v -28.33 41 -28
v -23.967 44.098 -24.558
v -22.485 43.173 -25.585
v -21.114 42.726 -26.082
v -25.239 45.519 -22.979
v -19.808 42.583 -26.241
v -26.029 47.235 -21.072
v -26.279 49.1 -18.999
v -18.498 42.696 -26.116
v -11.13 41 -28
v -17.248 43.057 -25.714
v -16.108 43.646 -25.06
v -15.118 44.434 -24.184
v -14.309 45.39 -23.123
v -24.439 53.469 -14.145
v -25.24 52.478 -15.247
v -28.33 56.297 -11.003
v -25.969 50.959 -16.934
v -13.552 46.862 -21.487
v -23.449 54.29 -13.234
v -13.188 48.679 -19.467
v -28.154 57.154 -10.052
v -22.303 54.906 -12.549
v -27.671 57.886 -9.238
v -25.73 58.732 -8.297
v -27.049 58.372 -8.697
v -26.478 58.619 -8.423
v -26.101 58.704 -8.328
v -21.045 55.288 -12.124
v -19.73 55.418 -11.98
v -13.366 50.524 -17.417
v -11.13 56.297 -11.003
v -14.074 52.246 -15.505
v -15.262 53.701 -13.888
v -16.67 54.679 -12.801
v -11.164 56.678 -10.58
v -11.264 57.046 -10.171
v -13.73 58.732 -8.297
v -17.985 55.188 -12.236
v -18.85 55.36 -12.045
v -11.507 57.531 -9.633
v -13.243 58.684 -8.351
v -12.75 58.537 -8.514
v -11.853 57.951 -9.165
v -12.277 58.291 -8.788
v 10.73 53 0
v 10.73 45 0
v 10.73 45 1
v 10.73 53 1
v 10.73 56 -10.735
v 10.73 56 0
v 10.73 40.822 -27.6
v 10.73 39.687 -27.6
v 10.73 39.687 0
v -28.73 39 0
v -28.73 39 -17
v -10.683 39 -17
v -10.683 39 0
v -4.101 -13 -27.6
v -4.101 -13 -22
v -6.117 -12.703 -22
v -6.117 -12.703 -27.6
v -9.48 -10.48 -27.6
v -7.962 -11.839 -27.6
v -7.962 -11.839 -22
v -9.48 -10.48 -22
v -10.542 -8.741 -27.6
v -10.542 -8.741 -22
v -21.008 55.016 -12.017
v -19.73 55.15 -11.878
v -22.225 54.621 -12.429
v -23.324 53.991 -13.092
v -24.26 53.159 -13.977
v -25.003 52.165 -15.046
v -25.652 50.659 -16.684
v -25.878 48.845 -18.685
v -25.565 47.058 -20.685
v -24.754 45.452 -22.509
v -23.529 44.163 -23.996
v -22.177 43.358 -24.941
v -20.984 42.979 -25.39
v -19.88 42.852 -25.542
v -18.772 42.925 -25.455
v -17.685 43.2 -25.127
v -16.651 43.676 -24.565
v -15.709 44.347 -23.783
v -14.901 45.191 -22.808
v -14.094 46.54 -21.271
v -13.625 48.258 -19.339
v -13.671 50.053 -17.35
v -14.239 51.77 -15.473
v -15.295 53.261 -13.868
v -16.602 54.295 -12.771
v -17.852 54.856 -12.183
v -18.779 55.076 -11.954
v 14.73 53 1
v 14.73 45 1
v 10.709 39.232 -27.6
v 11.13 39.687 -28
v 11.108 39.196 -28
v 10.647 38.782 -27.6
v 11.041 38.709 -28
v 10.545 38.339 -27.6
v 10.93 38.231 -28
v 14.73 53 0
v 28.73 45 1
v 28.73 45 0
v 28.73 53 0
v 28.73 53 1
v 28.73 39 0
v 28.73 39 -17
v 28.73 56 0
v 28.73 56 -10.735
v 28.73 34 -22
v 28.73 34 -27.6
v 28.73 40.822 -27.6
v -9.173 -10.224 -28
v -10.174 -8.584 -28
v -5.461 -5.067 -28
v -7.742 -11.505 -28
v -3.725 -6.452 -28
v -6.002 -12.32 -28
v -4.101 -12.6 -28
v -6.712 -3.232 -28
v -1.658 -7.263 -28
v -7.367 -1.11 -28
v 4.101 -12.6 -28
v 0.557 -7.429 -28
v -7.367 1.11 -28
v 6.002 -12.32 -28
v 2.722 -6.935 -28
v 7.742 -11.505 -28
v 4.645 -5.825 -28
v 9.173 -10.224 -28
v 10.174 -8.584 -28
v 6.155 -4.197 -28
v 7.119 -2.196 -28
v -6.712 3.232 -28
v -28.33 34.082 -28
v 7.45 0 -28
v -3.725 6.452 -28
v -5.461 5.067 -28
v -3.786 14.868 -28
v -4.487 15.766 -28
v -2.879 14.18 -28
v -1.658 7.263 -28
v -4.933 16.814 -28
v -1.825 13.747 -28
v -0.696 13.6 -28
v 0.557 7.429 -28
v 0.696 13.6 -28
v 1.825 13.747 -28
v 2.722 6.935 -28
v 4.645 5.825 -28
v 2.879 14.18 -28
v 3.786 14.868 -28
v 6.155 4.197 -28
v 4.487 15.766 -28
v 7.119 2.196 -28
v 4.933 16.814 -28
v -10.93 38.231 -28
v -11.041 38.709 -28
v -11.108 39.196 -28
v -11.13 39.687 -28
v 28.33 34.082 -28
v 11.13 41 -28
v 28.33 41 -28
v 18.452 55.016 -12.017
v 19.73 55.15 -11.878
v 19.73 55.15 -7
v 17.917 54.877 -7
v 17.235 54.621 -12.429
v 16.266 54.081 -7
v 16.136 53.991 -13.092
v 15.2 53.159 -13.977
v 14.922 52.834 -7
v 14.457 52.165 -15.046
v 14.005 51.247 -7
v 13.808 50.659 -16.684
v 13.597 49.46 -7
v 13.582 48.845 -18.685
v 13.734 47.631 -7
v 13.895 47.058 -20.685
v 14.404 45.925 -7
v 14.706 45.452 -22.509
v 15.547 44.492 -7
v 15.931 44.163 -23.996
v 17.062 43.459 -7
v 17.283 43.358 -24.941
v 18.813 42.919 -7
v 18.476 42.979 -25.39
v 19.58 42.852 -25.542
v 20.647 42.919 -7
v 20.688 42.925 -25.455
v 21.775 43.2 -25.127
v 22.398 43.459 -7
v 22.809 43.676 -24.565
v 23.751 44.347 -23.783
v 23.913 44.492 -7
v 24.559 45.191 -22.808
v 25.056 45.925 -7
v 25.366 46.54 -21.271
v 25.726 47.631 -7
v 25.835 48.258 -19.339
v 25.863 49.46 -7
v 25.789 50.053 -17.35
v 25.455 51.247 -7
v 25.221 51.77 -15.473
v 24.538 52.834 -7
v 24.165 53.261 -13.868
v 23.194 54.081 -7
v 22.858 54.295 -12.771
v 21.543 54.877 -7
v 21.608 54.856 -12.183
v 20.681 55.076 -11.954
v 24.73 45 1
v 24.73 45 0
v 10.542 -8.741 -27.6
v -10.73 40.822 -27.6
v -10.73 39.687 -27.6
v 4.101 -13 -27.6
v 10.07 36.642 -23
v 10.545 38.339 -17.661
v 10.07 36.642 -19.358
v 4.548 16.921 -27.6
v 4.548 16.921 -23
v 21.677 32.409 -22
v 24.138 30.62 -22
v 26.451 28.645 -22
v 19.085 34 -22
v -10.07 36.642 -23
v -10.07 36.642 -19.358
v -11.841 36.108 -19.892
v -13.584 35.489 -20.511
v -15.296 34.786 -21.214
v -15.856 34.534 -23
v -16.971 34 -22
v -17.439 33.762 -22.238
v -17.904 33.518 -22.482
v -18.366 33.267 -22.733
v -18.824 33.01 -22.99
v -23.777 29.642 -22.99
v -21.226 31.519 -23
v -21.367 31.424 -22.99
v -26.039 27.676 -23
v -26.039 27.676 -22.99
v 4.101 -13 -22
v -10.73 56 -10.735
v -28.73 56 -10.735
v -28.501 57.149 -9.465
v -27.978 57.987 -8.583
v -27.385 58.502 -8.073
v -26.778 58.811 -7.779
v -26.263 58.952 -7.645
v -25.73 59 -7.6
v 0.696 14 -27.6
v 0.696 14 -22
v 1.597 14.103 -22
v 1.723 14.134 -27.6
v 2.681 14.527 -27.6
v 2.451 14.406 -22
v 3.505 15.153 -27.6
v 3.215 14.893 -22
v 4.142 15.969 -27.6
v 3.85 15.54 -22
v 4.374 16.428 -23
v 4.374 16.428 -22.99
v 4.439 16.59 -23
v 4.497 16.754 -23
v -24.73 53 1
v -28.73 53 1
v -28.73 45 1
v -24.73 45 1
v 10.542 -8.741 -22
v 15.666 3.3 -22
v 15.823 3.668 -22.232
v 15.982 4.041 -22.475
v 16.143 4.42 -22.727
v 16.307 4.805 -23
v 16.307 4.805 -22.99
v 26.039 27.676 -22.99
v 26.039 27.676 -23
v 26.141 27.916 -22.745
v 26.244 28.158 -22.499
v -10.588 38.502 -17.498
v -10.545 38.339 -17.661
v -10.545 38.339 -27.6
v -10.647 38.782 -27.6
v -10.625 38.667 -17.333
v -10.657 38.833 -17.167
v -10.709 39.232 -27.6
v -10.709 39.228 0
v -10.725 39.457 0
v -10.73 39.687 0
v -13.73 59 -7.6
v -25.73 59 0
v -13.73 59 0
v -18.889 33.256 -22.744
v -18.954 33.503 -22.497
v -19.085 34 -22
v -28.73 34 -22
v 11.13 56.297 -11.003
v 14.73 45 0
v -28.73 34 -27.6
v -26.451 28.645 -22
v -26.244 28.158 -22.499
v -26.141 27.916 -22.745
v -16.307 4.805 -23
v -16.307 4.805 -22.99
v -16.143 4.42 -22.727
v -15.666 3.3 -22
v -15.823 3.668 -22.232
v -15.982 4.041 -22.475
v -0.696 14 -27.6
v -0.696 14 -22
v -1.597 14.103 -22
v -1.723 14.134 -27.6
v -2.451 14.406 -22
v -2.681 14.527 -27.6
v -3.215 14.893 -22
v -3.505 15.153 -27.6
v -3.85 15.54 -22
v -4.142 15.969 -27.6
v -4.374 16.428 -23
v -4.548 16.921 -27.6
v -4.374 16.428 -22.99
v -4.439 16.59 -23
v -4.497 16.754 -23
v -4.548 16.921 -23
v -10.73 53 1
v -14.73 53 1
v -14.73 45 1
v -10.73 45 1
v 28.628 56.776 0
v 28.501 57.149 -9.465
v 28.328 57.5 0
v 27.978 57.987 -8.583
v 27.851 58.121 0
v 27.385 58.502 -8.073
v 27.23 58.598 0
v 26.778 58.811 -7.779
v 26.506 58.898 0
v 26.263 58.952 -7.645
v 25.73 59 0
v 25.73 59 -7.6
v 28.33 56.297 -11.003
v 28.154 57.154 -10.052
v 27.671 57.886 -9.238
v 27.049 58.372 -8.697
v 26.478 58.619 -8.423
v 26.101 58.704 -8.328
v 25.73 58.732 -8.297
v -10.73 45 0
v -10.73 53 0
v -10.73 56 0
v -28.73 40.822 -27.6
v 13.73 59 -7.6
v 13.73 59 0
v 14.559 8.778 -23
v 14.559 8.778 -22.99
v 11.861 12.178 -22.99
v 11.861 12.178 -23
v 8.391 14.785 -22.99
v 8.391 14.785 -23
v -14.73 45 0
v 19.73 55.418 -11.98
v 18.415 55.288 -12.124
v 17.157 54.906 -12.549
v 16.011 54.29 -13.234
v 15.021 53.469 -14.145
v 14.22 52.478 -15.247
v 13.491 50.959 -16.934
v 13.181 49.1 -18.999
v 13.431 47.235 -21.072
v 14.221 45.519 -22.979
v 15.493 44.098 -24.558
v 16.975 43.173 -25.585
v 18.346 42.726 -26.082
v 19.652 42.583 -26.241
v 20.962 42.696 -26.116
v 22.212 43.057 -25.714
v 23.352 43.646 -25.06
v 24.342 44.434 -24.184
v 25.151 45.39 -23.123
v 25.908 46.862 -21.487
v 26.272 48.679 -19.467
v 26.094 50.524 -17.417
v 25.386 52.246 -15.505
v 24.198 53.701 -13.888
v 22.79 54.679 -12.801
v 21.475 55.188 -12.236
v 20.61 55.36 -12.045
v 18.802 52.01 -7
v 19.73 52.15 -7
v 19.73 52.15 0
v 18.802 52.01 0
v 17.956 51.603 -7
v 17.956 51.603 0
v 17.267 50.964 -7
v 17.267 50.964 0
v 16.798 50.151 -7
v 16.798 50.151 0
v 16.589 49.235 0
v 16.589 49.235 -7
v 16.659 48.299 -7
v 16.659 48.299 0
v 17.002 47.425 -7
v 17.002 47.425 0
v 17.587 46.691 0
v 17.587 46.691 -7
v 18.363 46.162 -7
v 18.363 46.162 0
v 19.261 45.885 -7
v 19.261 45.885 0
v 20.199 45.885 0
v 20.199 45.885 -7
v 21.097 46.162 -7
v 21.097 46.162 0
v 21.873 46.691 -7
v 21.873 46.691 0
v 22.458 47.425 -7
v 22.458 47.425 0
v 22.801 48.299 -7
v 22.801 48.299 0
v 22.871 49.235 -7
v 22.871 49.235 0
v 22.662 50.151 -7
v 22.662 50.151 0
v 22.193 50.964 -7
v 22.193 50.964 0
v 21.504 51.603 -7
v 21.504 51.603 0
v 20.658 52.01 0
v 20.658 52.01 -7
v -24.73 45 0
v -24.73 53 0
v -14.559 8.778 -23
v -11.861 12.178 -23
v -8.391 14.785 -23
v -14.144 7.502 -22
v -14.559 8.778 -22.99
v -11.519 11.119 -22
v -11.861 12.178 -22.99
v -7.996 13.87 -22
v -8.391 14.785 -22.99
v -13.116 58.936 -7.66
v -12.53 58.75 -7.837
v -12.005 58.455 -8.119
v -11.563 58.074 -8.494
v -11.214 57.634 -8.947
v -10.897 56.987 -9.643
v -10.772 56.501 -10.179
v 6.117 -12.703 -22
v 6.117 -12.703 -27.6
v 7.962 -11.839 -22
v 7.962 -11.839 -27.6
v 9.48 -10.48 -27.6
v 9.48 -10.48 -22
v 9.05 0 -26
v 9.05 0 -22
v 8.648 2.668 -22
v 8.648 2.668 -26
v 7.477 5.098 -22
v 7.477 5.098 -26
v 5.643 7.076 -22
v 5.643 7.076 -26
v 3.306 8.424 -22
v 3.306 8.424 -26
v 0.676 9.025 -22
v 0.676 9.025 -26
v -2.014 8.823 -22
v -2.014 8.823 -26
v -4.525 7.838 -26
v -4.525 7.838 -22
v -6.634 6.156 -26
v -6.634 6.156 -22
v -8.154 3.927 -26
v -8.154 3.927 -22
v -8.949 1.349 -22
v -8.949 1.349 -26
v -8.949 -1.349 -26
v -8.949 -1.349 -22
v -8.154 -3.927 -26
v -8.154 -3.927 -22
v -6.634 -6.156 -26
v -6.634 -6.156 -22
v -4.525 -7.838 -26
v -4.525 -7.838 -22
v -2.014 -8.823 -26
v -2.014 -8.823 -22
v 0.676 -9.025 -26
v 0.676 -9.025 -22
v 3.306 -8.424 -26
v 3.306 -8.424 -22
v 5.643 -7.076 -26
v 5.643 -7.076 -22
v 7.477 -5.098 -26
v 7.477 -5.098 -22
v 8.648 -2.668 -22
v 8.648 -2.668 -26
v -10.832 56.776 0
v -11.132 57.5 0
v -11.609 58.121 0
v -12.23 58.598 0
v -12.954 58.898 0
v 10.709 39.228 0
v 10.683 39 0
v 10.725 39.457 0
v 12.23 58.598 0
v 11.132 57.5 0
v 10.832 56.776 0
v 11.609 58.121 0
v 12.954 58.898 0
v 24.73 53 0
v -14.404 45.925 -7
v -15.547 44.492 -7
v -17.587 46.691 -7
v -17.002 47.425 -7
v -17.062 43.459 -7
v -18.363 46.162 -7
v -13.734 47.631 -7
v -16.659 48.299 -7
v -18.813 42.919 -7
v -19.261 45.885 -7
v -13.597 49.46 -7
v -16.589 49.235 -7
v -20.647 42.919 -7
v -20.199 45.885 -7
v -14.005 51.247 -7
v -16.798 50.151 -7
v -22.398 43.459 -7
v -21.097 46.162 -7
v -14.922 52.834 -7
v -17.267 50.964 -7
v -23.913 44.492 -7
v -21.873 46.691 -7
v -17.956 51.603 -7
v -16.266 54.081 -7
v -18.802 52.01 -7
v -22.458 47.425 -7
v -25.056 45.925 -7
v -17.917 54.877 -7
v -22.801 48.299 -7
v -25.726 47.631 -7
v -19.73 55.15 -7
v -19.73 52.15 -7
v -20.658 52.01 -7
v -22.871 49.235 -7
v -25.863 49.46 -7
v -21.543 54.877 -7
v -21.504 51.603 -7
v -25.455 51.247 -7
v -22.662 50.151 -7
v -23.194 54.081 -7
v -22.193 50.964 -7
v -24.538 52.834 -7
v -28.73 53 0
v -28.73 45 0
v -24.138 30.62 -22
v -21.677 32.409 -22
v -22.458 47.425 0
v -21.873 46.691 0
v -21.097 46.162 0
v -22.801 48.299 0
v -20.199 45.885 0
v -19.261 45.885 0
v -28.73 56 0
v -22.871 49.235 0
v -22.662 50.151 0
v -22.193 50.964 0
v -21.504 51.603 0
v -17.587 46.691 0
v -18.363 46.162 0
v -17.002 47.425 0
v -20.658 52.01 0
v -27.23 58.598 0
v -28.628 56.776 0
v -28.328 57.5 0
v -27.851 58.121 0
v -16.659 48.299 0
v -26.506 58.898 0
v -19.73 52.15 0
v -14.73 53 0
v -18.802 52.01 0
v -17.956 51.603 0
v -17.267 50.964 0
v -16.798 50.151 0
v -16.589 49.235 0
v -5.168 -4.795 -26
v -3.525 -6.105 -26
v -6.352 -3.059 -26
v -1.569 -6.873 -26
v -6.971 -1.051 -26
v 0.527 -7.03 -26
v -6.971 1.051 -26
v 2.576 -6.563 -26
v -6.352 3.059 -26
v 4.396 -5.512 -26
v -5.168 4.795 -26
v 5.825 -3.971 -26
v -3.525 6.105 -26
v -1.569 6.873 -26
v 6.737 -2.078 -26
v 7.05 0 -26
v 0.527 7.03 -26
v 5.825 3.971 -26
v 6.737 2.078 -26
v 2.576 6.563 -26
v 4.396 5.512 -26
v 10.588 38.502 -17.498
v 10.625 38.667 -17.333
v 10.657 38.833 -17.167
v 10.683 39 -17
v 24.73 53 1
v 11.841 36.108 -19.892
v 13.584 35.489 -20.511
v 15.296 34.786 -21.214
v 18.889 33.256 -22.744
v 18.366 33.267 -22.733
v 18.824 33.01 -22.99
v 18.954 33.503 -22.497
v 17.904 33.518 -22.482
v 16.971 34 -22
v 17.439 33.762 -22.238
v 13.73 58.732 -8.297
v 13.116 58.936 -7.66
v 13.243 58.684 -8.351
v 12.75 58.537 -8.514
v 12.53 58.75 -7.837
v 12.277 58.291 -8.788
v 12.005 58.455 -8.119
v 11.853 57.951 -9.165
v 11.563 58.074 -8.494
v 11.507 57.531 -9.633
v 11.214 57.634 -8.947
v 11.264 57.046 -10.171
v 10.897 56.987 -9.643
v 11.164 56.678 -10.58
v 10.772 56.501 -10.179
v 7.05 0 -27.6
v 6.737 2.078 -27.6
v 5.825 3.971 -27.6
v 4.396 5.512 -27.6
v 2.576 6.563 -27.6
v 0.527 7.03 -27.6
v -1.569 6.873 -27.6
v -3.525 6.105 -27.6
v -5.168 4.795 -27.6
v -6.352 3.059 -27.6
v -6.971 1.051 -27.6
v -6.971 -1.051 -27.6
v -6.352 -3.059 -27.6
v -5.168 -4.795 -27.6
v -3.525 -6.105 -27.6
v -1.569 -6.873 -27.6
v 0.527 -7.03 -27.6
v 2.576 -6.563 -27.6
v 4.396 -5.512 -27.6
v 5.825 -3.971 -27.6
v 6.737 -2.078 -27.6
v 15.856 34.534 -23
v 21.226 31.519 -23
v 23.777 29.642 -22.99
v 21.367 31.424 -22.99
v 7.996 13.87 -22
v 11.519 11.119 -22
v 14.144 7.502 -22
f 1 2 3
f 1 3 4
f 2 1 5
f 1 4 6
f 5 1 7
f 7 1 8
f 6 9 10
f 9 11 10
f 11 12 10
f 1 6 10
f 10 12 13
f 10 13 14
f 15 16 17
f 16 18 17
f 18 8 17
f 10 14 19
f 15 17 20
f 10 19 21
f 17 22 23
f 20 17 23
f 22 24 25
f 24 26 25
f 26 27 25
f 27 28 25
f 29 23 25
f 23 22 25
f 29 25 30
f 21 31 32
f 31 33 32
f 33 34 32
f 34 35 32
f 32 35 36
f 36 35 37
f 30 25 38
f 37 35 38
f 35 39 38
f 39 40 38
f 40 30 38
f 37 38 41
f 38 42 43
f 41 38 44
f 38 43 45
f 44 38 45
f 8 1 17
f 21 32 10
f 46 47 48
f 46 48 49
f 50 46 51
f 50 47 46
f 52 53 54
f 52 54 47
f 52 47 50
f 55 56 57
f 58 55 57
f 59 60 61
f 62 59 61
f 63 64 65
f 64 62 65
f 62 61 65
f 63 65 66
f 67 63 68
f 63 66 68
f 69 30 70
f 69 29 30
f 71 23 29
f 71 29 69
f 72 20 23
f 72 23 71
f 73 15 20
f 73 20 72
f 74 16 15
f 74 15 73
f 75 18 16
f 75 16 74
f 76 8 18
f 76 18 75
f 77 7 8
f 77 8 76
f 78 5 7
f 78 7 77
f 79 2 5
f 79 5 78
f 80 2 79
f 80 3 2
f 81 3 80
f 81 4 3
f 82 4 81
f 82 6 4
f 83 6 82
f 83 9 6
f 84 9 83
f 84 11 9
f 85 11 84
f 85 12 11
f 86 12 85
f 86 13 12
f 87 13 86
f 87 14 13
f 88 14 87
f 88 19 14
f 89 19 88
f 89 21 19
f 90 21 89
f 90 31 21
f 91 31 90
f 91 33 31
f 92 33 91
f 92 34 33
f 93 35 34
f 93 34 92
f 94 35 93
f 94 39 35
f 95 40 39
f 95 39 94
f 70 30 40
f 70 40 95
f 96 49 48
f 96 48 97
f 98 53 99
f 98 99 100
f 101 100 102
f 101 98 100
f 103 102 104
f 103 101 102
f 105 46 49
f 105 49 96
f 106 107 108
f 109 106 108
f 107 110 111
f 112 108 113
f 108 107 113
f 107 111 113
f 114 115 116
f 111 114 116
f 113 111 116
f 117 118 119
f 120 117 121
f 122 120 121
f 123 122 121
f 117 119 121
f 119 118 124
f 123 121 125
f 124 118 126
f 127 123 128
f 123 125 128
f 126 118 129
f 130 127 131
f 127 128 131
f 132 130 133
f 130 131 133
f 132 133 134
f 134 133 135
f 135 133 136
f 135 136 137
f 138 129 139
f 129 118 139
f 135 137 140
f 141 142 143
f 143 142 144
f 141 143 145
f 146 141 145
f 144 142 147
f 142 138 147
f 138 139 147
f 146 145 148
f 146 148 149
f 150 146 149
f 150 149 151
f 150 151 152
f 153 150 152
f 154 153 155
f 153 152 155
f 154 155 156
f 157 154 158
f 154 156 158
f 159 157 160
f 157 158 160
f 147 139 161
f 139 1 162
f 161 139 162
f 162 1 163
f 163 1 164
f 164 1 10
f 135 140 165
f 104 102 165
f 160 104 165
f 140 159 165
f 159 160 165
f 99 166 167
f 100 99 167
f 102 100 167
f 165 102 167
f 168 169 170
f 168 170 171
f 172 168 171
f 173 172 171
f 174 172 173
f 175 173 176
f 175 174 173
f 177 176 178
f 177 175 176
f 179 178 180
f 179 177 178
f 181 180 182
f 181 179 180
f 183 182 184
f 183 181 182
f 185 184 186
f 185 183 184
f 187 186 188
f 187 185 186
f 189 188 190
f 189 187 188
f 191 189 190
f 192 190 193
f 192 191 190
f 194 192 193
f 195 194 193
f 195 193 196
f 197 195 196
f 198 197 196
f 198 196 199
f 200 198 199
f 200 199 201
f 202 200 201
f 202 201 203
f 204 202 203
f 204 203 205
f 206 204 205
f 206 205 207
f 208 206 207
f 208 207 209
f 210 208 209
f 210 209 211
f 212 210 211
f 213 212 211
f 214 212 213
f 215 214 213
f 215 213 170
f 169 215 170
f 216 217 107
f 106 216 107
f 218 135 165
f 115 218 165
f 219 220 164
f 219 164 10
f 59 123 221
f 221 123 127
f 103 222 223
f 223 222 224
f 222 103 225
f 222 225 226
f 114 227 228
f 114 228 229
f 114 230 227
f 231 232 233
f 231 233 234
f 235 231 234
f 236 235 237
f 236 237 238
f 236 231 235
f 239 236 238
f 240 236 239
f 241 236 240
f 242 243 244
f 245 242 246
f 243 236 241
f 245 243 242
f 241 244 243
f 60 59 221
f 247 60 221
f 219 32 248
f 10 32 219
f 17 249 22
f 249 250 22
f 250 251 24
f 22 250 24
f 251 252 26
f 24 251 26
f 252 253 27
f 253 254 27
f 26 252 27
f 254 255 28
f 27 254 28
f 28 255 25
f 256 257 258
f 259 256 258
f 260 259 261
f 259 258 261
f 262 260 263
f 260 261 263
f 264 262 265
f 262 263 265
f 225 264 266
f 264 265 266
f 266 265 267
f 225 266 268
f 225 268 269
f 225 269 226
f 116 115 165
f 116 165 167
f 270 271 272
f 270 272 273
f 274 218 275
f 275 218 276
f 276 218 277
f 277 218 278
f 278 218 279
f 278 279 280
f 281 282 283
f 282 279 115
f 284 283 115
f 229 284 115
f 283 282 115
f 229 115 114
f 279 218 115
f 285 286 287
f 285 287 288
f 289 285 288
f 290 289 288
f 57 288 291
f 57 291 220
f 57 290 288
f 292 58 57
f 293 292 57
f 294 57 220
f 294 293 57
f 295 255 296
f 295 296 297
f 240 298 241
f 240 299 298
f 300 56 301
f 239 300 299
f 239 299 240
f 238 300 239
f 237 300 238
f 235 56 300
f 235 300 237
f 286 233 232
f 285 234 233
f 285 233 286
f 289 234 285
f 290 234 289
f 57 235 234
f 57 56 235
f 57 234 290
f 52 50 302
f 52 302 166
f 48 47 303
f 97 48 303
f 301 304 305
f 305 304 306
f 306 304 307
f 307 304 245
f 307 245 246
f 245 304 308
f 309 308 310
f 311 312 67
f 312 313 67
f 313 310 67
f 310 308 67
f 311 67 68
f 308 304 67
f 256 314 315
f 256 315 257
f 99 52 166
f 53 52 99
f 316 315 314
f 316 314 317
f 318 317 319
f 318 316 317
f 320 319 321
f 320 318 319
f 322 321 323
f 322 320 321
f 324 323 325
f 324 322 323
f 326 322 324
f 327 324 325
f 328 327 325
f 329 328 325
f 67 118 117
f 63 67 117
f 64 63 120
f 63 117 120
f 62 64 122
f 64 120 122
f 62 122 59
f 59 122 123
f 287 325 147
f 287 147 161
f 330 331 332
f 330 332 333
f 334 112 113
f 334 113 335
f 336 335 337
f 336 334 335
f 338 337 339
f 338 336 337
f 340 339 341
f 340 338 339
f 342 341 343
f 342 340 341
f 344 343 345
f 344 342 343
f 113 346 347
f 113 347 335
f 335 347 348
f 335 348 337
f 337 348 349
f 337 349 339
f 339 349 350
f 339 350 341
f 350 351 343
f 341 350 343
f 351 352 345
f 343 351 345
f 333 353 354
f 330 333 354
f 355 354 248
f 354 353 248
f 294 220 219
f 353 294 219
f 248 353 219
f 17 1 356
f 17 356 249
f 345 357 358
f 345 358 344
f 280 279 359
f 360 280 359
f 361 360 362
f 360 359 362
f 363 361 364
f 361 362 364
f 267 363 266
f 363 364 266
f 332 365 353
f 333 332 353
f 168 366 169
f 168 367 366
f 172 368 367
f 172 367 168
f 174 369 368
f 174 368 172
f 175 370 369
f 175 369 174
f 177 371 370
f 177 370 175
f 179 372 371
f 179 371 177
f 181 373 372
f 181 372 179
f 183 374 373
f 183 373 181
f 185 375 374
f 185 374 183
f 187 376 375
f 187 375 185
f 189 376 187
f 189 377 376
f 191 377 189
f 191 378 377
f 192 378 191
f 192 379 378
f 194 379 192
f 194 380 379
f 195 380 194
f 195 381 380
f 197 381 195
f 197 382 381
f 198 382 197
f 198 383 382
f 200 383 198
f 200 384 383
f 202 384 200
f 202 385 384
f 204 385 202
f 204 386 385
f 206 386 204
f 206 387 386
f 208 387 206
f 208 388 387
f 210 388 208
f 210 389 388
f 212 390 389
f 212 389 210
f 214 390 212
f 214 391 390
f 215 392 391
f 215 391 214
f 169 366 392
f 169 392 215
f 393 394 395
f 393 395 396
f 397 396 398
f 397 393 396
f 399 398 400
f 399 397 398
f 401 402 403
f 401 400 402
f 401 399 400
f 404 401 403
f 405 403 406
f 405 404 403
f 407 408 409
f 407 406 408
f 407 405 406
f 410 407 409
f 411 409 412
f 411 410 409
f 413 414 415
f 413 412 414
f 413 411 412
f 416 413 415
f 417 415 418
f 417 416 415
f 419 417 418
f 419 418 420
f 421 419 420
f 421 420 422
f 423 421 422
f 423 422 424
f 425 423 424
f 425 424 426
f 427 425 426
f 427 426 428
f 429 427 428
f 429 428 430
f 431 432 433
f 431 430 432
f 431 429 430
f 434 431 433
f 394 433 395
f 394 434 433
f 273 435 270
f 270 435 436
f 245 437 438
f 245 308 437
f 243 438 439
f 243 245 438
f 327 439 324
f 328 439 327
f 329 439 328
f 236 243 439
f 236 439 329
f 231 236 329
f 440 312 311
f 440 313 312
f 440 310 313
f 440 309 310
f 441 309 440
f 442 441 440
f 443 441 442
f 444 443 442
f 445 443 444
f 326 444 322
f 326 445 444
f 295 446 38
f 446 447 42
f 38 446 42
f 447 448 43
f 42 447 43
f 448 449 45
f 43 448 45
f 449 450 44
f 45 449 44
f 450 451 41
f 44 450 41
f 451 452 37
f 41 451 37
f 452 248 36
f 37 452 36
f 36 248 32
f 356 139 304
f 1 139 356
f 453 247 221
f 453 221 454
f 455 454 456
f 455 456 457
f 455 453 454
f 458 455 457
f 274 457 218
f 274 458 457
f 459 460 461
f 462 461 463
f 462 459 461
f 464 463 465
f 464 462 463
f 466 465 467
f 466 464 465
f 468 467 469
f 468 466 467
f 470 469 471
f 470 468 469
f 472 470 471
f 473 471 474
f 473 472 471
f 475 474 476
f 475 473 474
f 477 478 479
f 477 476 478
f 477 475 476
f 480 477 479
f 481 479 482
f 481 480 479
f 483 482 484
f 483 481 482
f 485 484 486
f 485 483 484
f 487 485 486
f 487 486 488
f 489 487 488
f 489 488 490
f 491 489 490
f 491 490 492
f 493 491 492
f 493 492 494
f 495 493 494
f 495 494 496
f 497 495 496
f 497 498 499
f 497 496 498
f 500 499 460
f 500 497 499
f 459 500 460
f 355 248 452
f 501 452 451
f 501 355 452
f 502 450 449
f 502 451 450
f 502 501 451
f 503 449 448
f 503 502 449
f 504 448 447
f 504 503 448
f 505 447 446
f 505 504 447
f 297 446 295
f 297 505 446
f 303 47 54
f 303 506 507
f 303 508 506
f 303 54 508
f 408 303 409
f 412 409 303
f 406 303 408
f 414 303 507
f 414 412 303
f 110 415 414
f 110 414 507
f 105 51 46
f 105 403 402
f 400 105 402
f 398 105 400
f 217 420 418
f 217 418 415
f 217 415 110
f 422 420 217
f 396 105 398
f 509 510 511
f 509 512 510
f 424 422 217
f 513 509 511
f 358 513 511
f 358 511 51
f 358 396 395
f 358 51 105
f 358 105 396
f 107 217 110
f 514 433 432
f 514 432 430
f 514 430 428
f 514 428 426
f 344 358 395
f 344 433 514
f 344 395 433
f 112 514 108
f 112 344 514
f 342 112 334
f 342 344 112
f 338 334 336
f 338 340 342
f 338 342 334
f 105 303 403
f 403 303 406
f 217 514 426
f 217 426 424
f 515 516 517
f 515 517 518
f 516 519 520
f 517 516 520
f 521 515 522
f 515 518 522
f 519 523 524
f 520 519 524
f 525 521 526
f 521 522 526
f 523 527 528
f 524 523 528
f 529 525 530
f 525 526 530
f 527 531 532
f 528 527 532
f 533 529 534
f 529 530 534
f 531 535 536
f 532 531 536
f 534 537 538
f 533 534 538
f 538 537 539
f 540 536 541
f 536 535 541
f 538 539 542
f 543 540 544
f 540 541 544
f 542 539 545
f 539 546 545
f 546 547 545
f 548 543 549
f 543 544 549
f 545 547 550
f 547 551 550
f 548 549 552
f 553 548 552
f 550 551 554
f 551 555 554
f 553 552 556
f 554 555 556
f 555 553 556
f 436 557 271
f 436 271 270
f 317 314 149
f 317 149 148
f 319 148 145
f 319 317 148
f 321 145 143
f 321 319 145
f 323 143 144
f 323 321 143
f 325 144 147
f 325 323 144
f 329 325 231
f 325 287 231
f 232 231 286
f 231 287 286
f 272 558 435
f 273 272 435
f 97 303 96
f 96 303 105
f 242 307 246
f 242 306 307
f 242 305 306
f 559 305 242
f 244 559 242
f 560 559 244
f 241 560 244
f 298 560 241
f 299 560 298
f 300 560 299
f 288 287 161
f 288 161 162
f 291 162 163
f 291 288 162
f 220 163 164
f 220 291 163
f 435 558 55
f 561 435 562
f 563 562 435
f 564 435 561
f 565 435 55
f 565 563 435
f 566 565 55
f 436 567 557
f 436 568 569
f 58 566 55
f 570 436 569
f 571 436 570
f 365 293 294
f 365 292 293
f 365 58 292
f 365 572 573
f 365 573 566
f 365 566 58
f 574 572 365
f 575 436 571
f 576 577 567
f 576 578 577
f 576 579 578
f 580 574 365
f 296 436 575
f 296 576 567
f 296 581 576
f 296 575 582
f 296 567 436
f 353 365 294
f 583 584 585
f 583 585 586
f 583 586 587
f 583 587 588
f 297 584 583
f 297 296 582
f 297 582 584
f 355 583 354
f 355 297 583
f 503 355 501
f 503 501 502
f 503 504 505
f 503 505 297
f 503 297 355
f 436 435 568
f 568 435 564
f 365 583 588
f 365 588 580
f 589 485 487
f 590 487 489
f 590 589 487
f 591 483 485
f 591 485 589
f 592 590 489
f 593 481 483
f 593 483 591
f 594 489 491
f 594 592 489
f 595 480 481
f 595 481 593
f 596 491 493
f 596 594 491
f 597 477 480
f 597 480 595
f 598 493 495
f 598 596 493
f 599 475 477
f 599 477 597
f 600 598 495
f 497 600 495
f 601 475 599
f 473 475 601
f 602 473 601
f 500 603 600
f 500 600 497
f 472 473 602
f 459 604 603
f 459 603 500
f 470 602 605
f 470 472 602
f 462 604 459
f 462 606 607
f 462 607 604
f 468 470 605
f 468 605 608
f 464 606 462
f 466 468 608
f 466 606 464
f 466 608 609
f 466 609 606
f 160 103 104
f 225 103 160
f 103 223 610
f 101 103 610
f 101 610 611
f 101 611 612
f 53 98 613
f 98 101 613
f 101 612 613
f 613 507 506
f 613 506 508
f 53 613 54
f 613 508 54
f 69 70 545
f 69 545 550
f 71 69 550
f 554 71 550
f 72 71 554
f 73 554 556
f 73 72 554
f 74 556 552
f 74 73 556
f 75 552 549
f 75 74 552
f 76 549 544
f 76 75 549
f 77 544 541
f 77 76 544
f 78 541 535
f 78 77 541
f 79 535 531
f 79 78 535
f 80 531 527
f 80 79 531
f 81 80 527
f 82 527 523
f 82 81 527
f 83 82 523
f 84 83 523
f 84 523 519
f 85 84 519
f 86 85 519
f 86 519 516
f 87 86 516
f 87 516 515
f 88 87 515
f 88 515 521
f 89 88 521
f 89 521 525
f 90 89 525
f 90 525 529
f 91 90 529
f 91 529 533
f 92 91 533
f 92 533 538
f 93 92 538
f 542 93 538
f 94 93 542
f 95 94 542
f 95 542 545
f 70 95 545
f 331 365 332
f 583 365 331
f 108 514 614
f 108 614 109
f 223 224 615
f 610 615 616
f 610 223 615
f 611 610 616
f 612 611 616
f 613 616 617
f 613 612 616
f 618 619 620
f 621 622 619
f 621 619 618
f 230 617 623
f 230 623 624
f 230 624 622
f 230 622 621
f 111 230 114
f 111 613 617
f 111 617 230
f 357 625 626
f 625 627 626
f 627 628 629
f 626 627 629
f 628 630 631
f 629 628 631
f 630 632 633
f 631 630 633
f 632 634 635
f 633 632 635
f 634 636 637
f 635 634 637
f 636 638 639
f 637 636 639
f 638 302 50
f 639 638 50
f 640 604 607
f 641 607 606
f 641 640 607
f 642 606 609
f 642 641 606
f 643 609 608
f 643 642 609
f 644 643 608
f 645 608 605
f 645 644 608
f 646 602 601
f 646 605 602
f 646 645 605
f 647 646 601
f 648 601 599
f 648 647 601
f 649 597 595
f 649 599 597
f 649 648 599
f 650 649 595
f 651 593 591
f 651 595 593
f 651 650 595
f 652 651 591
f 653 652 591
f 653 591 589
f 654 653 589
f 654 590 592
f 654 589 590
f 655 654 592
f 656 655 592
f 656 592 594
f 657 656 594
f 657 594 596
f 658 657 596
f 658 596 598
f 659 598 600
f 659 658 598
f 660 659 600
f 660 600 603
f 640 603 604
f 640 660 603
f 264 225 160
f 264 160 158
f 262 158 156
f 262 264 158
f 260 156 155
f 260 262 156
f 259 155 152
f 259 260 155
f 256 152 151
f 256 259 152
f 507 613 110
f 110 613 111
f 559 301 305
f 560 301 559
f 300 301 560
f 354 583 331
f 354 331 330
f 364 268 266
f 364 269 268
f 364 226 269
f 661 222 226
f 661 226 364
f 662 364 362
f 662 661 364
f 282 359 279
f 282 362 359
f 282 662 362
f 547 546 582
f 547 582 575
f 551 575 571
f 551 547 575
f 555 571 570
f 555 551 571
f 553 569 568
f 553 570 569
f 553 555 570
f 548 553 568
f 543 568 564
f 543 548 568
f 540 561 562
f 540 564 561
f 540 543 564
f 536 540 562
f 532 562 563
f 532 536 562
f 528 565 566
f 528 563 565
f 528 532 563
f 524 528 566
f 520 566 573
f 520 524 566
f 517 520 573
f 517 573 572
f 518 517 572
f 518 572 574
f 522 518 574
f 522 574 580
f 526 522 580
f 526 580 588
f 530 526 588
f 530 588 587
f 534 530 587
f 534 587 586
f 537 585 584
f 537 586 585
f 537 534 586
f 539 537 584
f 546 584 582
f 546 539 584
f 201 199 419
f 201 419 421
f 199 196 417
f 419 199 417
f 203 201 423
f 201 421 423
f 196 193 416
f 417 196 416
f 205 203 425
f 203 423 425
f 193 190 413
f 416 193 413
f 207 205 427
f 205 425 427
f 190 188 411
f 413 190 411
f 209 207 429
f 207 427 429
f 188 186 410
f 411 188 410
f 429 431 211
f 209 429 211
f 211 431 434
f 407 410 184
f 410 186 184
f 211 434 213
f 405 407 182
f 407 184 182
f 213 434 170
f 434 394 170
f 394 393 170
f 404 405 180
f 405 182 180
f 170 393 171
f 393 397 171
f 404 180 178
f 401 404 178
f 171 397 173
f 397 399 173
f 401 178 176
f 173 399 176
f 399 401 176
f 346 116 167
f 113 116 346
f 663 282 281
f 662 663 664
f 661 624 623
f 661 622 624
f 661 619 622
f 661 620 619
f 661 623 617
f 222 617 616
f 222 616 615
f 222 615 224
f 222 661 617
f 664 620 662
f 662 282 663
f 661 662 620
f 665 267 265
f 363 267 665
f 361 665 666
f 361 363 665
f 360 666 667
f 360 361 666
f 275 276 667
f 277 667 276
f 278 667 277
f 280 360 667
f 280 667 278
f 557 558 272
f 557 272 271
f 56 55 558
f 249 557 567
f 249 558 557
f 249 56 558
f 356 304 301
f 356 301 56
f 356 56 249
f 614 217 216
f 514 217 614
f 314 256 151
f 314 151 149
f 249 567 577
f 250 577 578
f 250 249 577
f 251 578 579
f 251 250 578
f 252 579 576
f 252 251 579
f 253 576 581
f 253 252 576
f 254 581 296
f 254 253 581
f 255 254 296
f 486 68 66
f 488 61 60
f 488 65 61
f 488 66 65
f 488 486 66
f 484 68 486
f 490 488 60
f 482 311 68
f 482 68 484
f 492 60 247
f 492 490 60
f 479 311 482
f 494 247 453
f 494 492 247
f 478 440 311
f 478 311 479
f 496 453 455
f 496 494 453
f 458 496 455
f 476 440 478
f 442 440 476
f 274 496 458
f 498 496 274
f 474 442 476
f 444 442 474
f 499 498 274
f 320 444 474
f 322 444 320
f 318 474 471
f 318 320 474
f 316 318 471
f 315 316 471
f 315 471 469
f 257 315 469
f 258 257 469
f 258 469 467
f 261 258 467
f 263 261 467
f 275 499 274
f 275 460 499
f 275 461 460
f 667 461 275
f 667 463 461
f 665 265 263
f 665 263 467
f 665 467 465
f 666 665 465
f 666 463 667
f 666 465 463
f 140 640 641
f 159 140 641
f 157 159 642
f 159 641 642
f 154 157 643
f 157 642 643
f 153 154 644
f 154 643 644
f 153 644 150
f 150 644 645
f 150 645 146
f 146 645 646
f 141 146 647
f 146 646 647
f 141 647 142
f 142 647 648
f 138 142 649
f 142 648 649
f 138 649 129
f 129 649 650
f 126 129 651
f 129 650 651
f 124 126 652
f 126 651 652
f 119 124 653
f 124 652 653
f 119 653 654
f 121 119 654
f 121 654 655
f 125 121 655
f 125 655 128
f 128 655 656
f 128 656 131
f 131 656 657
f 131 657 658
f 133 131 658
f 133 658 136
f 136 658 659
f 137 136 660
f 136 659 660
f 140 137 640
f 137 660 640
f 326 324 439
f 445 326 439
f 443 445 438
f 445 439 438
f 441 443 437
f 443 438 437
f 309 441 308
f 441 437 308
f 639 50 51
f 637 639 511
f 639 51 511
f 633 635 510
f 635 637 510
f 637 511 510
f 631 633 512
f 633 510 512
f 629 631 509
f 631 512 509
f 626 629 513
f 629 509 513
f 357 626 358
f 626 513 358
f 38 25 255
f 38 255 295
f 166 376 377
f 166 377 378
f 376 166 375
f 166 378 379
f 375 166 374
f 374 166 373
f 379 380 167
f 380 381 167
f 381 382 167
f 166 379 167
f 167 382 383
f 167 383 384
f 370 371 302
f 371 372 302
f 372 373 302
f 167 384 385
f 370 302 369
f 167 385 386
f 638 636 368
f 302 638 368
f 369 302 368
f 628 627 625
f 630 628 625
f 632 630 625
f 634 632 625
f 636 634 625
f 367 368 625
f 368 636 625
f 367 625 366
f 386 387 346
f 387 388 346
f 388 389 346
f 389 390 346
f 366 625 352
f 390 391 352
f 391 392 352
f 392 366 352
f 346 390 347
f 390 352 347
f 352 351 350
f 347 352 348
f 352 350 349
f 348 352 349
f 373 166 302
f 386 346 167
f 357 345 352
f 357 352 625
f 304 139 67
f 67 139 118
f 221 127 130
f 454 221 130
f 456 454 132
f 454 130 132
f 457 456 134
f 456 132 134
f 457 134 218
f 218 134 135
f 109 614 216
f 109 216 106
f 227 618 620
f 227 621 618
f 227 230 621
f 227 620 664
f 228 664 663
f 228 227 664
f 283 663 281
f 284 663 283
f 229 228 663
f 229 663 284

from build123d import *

# Parameters (mm, degrees)
CYLINDER037_R                = 17
CYLINDER037_DEPTH            = 10
CYLINDER036_R                = 38
CYLINDER036_DEPTH            = 10
BOX046_W                     = 4
BOX046_H                     = 8
BOX046_DEPTH                 = 1
BOX045_W                     = 4
BOX045_H                     = 8
BOX045_DEPTH                 = 1
BOX043_W                     = 4
BOX043_H                     = 8
BOX043_DEPTH                 = 1
BOX047_W                     = 4
BOX047_H                     = 8
BOX047_DEPTH                 = 1
CYLINDER033_R                = 3.15
CYLINDER033_DEPTH            = 65
CYLINDER034_R                = 3.15
CYLINDER034_DEPTH            = 65
CYLINDER032_R                = 6.15
CYLINDER032_DEPTH            = 28
CYLINDER031_R                = 6.15
CYLINDER031_DEPTH            = 28
BOX044_W                     = 21.46
BOX044_H                     = 55
BOX044_DEPTH                 = 45
CHAMFER003068012002082_SIZE2 = 7
CHAMFER003068012002082_SIZE  = 25
CHAMFER003068012002083_SIZE2 = 25
CHAMFER003068012002083_SIZE  = 7
FILLET003002010_R            = 4
FILLET003002011_R            = 5
CYLINDER_R                   = 9.05
CYLINDER_DEPTH               = 10
CYLINDER030_R                = 7.05
CYLINDER030_DEPTH            = 10
BOX041_W                     = 57.46
BOX041_H                     = 72
BOX041_DEPTH                 = 6
CHAMFER003068012002084_SIZE2 = 20
CHAMFER003068012002084_SIZE  = 47
CHAMFER003068012002085_SIZE2 = 47
CHAMFER003068012002085_SIZE  = 20
FILLET003002012_R            = 7
BOX042_W                     = 57.46
BOX042_H                     = 20
BOX042_DEPTH                 = 22
CHAMFER003068012002086_SIZE2 = 20
CHAMFER003068012002086_SIZE  = 18
CHAMFER003068012002087_SIZE  = 5
FILLET003002013_R            = 3
CHAMFER003068012002088_SIZE  = 0.99
CHAMFER003068012002089_SIZE  = 0.99
CHAMFER003068012002090_SIZE  = 0.4


with BuildPart() as cylinder037:
    # Cylinder037 → Cylinder037 (new body)
    with BuildSketch(Plane.XY.offset(-23)):
        Circle(CYLINDER037_R)
    extrude(amount=CYLINDER037_DEPTH)


with BuildPart() as cut001040:
    # Cylinder036 → Cylinder036 (new body)
    with BuildSketch(Plane.XY.offset(-23)):
        Circle(CYLINDER036_R)
    extrude(amount=CYLINDER036_DEPTH)

    # Cut001040: cut Cylinder037
    add(cylinder037.part, mode=Mode.SUBTRACT)


with BuildPart() as cube046:
    # Box046 → Box046 (new body)
    with BuildSketch(Plane(origin=(10.73, 45, 0), x_dir=(1, 0, 0), z_dir=(0, 0, 1))):
        with Locations((2, 4)):
            Rectangle(BOX046_W, BOX046_H)
    extrude(amount=BOX046_DEPTH)


with BuildPart() as cube045:
    # Box045 → Box045 (new body)
    with BuildSketch(Plane(origin=(-14.73, 45, 0), x_dir=(1, 0, 0), z_dir=(0, 0, 1))):
        with Locations((2, 4)):
            Rectangle(BOX045_W, BOX045_H)
    extrude(amount=BOX045_DEPTH)


with BuildPart() as cube043:
    # Box043 → Box043 (new body)
    with BuildSketch(Plane(origin=(-28.73, 45, 0), x_dir=(1, 0, 0), z_dir=(0, 0, 1))):
        with Locations((2, 4)):
            Rectangle(BOX043_W, BOX043_H)
    extrude(amount=BOX043_DEPTH)


with BuildPart() as fusion001002012032:
    # Box047 → Box047 (new body)
    with BuildSketch(Plane(origin=(24.73, 45, 0), x_dir=(1, 0, 0), z_dir=(0, 0, 1))):
        with Locations((2, 4)):
            Rectangle(BOX047_W, BOX047_H)
    extrude(amount=BOX047_DEPTH)

    # Fusion001002012032: union Cube046, Cube045, Cube043
    add(cube046.part)
    add(cube045.part)
    add(cube043.part)


with BuildPart() as cylinder033:
    # Cylinder033 → Cylinder033 (new body)
    with BuildSketch(Plane(origin=(-19.73, 49, -41), x_dir=(0, 1, 0), z_dir=(0, 0, 1))):
        Circle(CYLINDER033_R)
    extrude(amount=CYLINDER033_DEPTH)


with BuildPart() as fusion001002012030:
    # Cylinder034 → Cylinder034 (new body)
    with BuildSketch(Plane(origin=(19.73, 49, -41), x_dir=(0, 1, 0), z_dir=(0, 0, 1))):
        Circle(CYLINDER034_R)
    extrude(amount=CYLINDER034_DEPTH)

    # Fusion001002012030: union Cylinder033
    add(cylinder033.part)


with BuildPart() as cylinder032:
    # Cylinder032 → Cylinder032 (new body)
    with BuildSketch(Plane(origin=(-19.73, 49, -41), x_dir=(0, 1, 0), z_dir=(0, 0, 1))):
        Circle(CYLINDER032_R)
    extrude(amount=CYLINDER032_DEPTH)


with BuildPart() as fusion001002012031:
    # Cylinder031 → Cylinder031 (new body)
    with BuildSketch(Plane(origin=(19.73, 49, -41), x_dir=(0, 1, 0), z_dir=(0, 0, 1))):
        Circle(CYLINDER031_R)
    extrude(amount=CYLINDER031_DEPTH)

    # Fusion001002012031: union Cylinder032
    add(cylinder032.part)


with BuildPart() as fusion001002012031_1:
    # Fusion001002012031 placement: moved
    add(fusion001002012031.part.moved(Location((0, 0, 6))))


with BuildPart() as fillet003002011:
    # Box044 → Box044 (new body)
    with BuildSketch(Plane(origin=(-10.73, 14, -35), x_dir=(1, 0, 0), z_dir=(0, 0, 1))):
        with Locations((10.73, 27.5)):
            Rectangle(BOX044_W, BOX044_H)
    extrude(amount=BOX044_DEPTH)

    # Chamfer003068012002082
    chamfer003068012002082_edges = [fillet003002011.edges().sort_by_distance(p)[0] for p in [
        (10.73, 14, -12.5),
    ]]
    chamfer003068012002082_side = fillet003002011.faces().sort_by_distance((10.73, 41.5, -12.5))[0]
    chamfer(chamfer003068012002082_edges, length=CHAMFER003068012002082_SIZE, length2=CHAMFER003068012002082_SIZE2, reference=chamfer003068012002082_side)

    # Chamfer003068012002083
    chamfer003068012002083_edges = [fillet003002011.edges().sort_by_distance(p)[0] for p in [
        (-10.73, 14, -12.5),
    ]]
    chamfer003068012002083_side = fillet003002011.faces().sort_by_distance((-3.5, 14, -12.5))[0]
    chamfer(chamfer003068012002083_edges, length=CHAMFER003068012002083_SIZE, length2=CHAMFER003068012002083_SIZE2, reference=chamfer003068012002083_side)

    # Fillet003002010
    fillet003002010_edges = [fillet003002011.edges().sort_by_distance(p)[0] for p in [
        (-3.73, 14, -12.5),
        (3.73, 14, -12.5),
    ]]
    fillet(fillet003002010_edges, radius=FILLET003002010_R)

    # Fillet003002011
    fillet003002011_edges = [fillet003002011.edges().sort_by_distance(p)[0] for p in [
        (-10.73, 39, -12.5),
        (10.73, 39, -12.5),
    ]]
    fillet(fillet003002011_edges, radius=FILLET003002011_R)


with BuildPart() as cylinder:
    # Cylinder → Cylinder (new body)
    with BuildSketch(Plane.XY.offset(-27)):
        Circle(CYLINDER_R)
    extrude(amount=CYLINDER_DEPTH)


with BuildPart() as fusion001002012028:
    # Cylinder030 → Cylinder030 (new body)
    with BuildSketch(Plane.XY.offset(-29)):
        Circle(CYLINDER030_R)
    extrude(amount=CYLINDER030_DEPTH)

    # Fusion001002012028: union Cylinder
    add(cylinder.part)


with BuildPart() as fusion001002012028_1:
    # Fusion001002012028 placement: moved
    add(fusion001002012028.part.moved(Location((0, 0, 1))))


with BuildPart() as fillet003002012:
    # Box041 → Box041 (new body)
    with BuildSketch(Plane(origin=(-28.73, -13, -28), x_dir=(1, 0, 0), z_dir=(0, 0, 1))):
        with Locations((28.73, 36)):
            Rectangle(BOX041_W, BOX041_H)
    extrude(amount=BOX041_DEPTH)

    # Chamfer003068012002084
    chamfer003068012002084_edges = [fillet003002012.edges().sort_by_distance(p)[0] for p in [
        (-28.73, -13, -25),
    ]]
    chamfer003068012002084_side = fillet003002012.faces().sort_by_distance((-28.73, 23, -25))[0]
    chamfer(chamfer003068012002084_edges, length=CHAMFER003068012002084_SIZE, length2=CHAMFER003068012002084_SIZE2, reference=chamfer003068012002084_side)

    # Chamfer003068012002085
    chamfer003068012002085_edges = [fillet003002012.edges().sort_by_distance(p)[0] for p in [
        (28.73, -13, -25),
    ]]
    chamfer003068012002085_side = fillet003002012.faces().sort_by_distance((10, -13, -25))[0]
    chamfer(chamfer003068012002085_edges, length=CHAMFER003068012002085_SIZE, length2=CHAMFER003068012002085_SIZE2, reference=chamfer003068012002085_side)

    # Fillet003002012
    fillet003002012_edges = [fillet003002012.edges().sort_by_distance(p)[0] for p in [
        (-8.73, -13, -25),
        (8.73, -13, -25),
    ]]
    fillet(fillet003002012_edges, radius=FILLET003002012_R)


with BuildPart() as cut001036:
    # Cut001036 base: copy of Fillet003002012
    add(fillet003002012.part)

    # Cut001036: cut Fusion001002012028
    add(fusion001002012028_1.part, mode=Mode.SUBTRACT)


with BuildPart() as cut001035:
    # Cut001035 base: copy of Fillet003002012
    add(fillet003002012.part)

    # Cut001035: cut Fusion001002012028
    add(fusion001002012028_1.part, mode=Mode.SUBTRACT)


with BuildPart() as mounter_front:
    # Box042 → Box042 (new body)
    with BuildSketch(Plane(origin=(-28.73, 39, -22), x_dir=(1, 0, 0), z_dir=(0, 0, 1))):
        with Locations((28.73, 10)):
            Rectangle(BOX042_W, BOX042_H)
    extrude(amount=BOX042_DEPTH)

    # Fusion001002012033: union Cut001035
    add(cut001035.part)

    # Fusion001002012034: union Cut001036
    add(cut001036.part)

    # Chamfer003068012002086
    chamfer003068012002086_edges = [mounter_front.edges().sort_by_distance(p)[0] for p in [
        (0, 59, -28),
    ]]
    chamfer003068012002086_side = mounter_front.faces().sort_by_distance((0, 30.57213, -28))[0]
    chamfer(chamfer003068012002086_edges, length=CHAMFER003068012002086_SIZE, length2=CHAMFER003068012002086_SIZE2, reference=chamfer003068012002086_side)

    # Cut001037: cut Fillet003002011
    add(fillet003002011.part, mode=Mode.SUBTRACT)

    # Chamfer003068012002087
    chamfer003068012002087_edges = [mounter_front.edges().sort_by_distance(p)[0] for p in [
        (-19.706303, 39, -22),
        (19.706303, 39, -22),
    ]]
    chamfer(chamfer003068012002087_edges, length=CHAMFER003068012002087_SIZE)

    # Cut001038: cut Fusion001002012031
    add(fusion001002012031_1.part, mode=Mode.SUBTRACT)

    # Cut001039: cut Fusion001002012030
    add(fusion001002012030.part, mode=Mode.SUBTRACT)

    # Fusion001002012035: union Fusion001002012032
    add(fusion001002012032.part)

    # Fillet003002013
    fillet003002013_edges = [mounter_front.edges().sort_by_distance(p)[0] for p in [
        (-10.73, 59, -4),
        (-28.73, 59, -4),
        (28.73, 59, -4),
        (10.73, 59, -4),
    ]]
    fillet(fillet003002013_edges, radius=FILLET003002013_R)

    # Cut001041: cut Cut001040
    add(cut001040.part, mode=Mode.SUBTRACT)

    # Chamfer003068012002088
    chamfer003068012002088_edges = [mounter_front.edges().sort_by_distance(p)[0] for p in [
        (11.861461, 12.178085, -22),
        (-11.861461, 12.178085, -22),
    ]]
    chamfer(chamfer003068012002088_edges, length=CHAMFER003068012002088_SIZE)

    # Chamfer003068012002089
    chamfer003068012002089_edges = [mounter_front.edges().sort_by_distance(p)[0] for p in [
        (-21.735995, 31.169641, -22),
        (21.735995, 31.169641, -22),
    ]]
    chamfer(chamfer003068012002089_edges, length=CHAMFER003068012002089_SIZE)

    # Chamfer003068012002090
    chamfer003068012002090_edges = [mounter_front.edges().sort_by_distance(p)[0] for p in [
        (-19.636194, 12.629557, -28),
        (-28.73, 48.5, -19.666667),
        (-28.73, 37.5, -28),
        (-7.962252, -11.83893, -28),
        (0, -13, -28),
        (7.962252, -11.83893, -28),
        (19.636194, 12.629557, -28),
        (28.73, 37.5, -28),
        (10.73, 40.343396, -28),
        (10.683489, 39.006389, -28),
        (7.546417, 27.630062, -28),
        (3.11338, 14.812989, -28),
        (0, 14, -28),
        (-3.11338, 14.812989, -28),
        (-7.546417, 27.630062, -28),
        (-10.683489, 39.006389, -28),
        (-10.73, 40.343396, -28),
        (-7.05, 0, -28),
        (-28.042876, 57.910655, -9.210383),
        (-10.73, 48.5, -19.666667),
        (-11.417124, 57.910655, -9.210383),
        (-19.73, 59, -8),
        (-19.723632, 42.850003, -25.944441),
        (28.73, 48.5, -19.666667),
        (10.73, 48.5, -19.666667),
        (28.042876, 57.910655, -9.210383),
        (19.73, 59, -8),
        (11.417124, 57.910655, -9.210383),
        (19.736368, 42.850003, -25.944441),
    ]]
    chamfer(chamfer003068012002090_edges, length=CHAMFER003068012002090_SIZE)


solid = mounter_front.part
